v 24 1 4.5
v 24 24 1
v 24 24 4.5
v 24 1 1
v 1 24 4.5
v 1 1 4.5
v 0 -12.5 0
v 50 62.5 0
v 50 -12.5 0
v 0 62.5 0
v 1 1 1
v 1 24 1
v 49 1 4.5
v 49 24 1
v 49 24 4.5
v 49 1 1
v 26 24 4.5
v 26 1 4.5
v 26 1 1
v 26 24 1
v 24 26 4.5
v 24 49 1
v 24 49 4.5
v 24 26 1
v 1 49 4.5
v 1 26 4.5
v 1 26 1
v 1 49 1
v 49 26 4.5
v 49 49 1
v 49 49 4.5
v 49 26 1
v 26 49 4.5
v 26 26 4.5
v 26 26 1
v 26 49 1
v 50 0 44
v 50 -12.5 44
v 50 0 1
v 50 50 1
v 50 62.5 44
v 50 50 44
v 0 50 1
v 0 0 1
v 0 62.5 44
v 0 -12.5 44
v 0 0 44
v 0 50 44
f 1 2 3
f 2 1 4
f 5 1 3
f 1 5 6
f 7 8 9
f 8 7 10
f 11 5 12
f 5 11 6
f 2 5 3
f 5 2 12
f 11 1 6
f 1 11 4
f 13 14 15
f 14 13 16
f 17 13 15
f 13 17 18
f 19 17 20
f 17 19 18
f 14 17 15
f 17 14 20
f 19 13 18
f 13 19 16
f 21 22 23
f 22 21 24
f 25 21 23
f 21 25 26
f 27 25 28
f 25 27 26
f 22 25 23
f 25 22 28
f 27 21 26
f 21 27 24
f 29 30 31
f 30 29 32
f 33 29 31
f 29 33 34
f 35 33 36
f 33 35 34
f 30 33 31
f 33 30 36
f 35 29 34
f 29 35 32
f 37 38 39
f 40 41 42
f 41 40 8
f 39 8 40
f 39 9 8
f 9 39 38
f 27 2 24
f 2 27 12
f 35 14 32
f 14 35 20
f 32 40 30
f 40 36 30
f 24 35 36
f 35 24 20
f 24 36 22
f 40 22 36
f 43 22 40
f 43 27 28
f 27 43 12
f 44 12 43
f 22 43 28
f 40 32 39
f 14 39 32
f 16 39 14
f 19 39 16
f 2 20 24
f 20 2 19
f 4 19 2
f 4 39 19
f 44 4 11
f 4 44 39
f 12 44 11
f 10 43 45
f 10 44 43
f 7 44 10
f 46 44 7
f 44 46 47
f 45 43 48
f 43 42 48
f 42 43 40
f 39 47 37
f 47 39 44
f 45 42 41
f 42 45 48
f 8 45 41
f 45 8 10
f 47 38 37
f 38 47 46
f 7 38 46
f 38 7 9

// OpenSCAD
color("LightGray") {
    translate([1,1,0]) cube([23,23,4.5]);
    translate([25+1,1,0]) cube([23,23,4.5]);
    translate([1,25+1,0]) cube([23,23,4.5]);
    translate([25+1,25+1,0]) cube([23,23,4.5]);
}
color("Grey") {
    cube([50,50,7-6]);
    translate([0,50,0]) cube([50,12.5,50-6]);
    translate([0,-12.5,0]) cube([50,12.5,50-6]);
}
